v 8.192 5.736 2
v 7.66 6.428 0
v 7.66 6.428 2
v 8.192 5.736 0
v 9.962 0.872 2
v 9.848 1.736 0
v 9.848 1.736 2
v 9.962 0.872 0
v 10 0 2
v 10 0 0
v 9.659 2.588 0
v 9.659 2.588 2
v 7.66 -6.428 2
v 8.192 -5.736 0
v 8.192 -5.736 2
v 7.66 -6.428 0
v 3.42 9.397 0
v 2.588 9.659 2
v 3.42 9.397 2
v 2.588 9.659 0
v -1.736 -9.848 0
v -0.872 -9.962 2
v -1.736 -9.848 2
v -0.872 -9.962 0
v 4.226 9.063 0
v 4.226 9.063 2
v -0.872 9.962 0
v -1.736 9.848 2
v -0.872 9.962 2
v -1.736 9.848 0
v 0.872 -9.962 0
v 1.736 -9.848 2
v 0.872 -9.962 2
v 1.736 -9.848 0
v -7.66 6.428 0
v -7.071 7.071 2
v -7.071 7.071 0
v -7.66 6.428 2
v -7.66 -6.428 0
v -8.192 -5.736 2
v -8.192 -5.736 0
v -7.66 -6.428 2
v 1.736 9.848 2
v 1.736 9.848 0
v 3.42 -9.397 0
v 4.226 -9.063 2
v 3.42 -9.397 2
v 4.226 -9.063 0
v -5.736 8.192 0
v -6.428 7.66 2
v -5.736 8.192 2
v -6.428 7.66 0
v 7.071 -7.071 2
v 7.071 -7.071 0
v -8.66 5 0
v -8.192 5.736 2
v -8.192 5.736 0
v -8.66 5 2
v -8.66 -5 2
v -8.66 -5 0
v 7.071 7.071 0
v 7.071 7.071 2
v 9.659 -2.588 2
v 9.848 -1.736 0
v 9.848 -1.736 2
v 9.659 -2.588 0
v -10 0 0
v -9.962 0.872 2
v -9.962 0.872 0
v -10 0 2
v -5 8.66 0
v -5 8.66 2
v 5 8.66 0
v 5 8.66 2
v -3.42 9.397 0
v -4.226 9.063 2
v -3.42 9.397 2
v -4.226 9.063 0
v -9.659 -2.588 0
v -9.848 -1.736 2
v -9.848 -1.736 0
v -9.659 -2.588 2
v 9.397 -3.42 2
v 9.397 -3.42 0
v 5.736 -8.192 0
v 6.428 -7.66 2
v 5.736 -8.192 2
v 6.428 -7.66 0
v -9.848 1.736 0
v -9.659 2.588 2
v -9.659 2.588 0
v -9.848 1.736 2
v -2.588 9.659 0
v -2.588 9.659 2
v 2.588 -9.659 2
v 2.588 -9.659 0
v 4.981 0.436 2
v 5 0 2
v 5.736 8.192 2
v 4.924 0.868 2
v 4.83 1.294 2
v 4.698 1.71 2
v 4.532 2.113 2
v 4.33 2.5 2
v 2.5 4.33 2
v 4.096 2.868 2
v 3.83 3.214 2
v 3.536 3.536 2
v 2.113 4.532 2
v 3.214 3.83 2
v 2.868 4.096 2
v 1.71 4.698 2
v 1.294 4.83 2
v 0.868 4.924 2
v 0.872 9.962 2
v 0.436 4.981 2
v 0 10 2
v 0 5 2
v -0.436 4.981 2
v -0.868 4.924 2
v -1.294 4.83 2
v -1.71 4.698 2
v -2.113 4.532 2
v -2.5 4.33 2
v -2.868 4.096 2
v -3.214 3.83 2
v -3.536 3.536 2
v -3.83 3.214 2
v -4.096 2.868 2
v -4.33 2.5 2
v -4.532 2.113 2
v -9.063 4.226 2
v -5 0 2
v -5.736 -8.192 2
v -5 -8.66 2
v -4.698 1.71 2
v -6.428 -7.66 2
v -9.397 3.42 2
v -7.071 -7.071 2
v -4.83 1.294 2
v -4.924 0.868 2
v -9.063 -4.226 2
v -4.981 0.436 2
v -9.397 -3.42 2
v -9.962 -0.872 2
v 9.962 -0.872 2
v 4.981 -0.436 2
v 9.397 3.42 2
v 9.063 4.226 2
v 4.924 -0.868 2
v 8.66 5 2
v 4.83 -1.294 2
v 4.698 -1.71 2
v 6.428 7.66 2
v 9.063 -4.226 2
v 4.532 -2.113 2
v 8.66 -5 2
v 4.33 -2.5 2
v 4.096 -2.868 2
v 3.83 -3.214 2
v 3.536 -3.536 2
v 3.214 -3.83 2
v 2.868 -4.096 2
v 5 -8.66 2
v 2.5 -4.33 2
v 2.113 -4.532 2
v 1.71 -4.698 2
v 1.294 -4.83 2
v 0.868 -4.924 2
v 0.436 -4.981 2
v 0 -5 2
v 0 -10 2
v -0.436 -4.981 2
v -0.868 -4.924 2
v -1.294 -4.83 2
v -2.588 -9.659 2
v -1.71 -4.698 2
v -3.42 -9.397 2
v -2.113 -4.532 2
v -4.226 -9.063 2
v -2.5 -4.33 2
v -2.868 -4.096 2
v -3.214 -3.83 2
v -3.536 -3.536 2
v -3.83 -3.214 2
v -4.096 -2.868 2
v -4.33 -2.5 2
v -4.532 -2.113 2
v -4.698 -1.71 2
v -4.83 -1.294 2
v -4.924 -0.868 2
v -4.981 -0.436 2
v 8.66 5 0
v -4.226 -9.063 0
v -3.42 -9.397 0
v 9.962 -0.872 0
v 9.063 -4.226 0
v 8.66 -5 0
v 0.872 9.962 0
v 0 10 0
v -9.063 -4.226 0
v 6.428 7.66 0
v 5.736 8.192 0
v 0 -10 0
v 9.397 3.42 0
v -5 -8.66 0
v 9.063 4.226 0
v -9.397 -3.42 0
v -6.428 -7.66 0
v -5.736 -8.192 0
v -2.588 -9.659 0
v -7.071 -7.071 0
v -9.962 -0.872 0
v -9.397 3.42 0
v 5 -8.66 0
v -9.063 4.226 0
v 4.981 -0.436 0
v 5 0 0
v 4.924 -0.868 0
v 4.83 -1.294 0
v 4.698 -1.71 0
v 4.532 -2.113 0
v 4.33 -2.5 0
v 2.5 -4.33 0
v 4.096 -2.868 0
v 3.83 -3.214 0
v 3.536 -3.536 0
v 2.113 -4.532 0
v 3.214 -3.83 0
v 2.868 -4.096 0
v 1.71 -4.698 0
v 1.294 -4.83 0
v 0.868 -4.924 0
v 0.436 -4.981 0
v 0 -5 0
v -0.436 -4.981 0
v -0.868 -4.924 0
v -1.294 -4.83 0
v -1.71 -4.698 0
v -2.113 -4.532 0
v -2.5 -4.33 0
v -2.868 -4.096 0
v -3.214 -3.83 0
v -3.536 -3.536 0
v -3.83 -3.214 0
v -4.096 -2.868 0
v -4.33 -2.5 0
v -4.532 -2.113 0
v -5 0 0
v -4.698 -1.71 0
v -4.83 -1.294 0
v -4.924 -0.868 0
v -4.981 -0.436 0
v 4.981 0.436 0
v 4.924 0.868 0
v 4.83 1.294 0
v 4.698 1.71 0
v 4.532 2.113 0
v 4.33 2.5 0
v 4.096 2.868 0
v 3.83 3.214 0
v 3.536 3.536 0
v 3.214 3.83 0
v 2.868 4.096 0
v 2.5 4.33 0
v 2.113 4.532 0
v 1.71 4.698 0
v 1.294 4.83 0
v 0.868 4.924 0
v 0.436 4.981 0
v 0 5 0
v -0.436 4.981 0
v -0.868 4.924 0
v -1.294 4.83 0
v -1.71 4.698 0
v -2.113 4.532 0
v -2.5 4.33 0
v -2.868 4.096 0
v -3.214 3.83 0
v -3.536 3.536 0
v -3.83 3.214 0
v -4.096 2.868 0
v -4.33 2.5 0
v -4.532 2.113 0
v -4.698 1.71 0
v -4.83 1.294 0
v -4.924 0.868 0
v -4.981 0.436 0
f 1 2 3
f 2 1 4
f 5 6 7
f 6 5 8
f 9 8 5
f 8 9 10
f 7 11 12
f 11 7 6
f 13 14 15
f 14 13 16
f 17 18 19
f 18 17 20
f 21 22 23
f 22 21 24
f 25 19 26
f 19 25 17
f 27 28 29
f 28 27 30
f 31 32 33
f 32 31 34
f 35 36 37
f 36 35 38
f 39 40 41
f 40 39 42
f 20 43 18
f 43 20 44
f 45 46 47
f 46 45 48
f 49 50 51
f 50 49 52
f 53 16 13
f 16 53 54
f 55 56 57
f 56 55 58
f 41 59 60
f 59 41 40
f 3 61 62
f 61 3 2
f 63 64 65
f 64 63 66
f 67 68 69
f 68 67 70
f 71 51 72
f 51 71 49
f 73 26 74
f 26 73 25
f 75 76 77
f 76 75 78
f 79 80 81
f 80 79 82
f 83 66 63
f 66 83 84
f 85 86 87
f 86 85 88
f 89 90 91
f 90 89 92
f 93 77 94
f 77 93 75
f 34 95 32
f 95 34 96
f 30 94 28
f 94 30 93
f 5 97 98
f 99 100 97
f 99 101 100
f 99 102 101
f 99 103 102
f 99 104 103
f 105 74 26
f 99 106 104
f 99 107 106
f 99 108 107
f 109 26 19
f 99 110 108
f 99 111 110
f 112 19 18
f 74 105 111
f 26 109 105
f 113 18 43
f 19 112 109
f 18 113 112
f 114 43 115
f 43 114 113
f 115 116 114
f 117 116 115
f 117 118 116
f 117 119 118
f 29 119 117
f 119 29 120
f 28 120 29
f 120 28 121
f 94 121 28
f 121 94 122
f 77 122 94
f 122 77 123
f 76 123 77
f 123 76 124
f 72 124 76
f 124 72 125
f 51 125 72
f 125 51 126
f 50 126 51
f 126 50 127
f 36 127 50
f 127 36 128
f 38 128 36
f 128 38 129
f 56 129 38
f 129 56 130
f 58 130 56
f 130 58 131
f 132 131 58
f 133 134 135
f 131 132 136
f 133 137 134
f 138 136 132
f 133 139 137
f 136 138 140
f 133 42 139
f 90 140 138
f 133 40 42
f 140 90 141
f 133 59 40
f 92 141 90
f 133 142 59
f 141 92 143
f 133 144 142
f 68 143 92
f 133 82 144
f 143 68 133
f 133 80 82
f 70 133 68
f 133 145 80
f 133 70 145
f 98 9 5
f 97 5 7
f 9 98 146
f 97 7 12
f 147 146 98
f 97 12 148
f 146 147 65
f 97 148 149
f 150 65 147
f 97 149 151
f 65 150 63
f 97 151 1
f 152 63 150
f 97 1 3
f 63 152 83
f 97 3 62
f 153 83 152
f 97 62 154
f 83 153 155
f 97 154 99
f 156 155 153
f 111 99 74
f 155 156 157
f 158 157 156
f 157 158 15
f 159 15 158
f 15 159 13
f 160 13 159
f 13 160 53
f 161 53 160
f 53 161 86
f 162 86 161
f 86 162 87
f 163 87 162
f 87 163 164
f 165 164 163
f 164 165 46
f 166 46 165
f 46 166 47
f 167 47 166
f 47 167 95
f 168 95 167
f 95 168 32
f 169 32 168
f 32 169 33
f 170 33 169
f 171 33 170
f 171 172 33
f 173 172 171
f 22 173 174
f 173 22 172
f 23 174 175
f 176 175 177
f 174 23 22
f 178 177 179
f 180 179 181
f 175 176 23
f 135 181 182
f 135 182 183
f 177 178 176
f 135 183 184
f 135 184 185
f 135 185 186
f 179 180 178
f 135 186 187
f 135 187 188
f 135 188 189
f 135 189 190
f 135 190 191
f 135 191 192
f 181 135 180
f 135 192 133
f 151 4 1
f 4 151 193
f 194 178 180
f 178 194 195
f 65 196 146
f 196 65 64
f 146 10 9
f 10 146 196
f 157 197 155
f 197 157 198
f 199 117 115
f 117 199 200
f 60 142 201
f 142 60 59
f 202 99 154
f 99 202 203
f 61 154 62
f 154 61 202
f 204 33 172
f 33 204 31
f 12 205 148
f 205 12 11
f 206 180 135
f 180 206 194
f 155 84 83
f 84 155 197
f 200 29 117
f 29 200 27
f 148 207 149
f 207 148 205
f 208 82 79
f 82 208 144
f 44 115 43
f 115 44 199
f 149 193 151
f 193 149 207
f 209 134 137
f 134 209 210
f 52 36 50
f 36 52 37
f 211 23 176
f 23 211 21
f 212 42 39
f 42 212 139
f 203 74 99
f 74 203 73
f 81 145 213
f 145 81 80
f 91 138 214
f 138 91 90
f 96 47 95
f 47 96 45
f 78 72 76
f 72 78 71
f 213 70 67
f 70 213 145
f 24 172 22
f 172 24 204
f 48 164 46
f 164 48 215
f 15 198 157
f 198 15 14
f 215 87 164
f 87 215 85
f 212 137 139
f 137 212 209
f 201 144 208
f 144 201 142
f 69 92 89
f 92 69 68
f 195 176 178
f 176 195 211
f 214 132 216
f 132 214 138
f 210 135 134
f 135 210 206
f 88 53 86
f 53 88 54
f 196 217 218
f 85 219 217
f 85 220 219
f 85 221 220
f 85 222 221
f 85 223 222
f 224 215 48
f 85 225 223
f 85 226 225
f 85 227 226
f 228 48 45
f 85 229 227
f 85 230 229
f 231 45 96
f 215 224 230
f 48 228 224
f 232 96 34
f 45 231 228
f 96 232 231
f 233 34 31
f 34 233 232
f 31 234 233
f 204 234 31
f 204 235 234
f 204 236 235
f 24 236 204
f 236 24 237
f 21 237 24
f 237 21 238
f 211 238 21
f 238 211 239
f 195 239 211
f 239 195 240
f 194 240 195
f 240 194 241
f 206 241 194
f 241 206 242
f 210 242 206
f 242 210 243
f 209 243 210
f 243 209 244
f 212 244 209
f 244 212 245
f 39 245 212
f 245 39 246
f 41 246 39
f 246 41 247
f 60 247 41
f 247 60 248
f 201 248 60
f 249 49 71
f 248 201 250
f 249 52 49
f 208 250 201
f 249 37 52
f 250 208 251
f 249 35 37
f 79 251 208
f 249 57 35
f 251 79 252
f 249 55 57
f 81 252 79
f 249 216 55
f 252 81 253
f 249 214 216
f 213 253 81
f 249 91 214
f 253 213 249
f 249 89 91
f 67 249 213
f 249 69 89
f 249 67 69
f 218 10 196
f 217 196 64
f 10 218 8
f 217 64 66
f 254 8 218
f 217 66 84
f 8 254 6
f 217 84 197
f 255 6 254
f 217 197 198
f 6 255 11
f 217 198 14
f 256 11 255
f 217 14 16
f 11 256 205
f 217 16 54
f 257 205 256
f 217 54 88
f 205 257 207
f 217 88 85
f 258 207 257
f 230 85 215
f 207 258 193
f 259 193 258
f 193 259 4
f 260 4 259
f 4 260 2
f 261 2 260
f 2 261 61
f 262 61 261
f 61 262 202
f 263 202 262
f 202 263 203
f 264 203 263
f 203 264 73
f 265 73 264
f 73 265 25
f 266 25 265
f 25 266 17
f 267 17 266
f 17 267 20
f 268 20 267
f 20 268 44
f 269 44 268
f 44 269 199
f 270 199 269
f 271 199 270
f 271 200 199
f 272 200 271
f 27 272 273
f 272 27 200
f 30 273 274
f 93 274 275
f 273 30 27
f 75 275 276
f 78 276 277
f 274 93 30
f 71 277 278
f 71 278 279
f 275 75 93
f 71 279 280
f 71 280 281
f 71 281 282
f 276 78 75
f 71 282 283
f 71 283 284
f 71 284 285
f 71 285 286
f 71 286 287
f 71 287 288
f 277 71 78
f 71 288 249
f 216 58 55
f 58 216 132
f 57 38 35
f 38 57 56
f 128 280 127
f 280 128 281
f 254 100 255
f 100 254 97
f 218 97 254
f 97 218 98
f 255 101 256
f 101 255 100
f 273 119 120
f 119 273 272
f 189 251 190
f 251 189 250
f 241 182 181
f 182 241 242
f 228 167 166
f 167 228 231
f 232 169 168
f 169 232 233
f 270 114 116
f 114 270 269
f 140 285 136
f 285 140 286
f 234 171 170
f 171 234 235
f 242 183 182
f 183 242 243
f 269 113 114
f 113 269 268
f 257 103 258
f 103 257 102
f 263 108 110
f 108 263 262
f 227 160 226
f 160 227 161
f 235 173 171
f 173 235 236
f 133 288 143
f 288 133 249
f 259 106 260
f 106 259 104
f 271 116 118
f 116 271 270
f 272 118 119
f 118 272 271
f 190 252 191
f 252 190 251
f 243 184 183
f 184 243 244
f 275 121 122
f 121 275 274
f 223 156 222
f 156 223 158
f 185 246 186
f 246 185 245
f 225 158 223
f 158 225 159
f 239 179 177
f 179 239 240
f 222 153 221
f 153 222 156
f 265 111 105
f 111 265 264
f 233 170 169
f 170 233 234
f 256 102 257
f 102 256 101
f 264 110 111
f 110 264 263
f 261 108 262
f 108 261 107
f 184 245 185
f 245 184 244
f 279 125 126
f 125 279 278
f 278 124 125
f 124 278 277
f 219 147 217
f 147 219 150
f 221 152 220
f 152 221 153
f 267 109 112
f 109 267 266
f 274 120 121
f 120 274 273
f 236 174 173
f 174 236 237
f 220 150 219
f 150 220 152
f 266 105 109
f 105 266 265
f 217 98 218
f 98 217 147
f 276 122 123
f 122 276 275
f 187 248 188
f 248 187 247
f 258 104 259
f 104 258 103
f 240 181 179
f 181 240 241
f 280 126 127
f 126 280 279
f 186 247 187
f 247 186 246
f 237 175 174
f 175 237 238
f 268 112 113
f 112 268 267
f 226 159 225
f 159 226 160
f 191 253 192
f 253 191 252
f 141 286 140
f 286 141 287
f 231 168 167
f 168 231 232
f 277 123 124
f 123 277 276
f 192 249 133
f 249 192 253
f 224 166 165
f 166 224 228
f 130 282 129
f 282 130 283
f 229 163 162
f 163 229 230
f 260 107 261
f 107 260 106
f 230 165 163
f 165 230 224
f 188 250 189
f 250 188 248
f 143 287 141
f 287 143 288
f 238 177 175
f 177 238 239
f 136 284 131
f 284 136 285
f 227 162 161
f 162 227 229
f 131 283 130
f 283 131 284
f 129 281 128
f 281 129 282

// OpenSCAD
// Flat washer / spacer ring. NOVEL general fastener part.
//
// @desc flat washer / spacer ring
// @prompt Design a flat washer in OpenSCAD: a ring {od} mm in outer diameter and {t} mm thick with a {bore} mm hole. Reply with a single complete OpenSCAD file.
// @param od   outer diameter, mm  [16:50]
// @param bore hole diameter, mm   [3:14]
// @param t    thickness, mm       [1:6]

od   = 20;
bore = 10;
t    = 2;

$fn = 72;

difference() {
    cylinder(h = t, d = od);
    translate([0, 0, -1]) cylinder(h = t + 2, d = bore);
}
